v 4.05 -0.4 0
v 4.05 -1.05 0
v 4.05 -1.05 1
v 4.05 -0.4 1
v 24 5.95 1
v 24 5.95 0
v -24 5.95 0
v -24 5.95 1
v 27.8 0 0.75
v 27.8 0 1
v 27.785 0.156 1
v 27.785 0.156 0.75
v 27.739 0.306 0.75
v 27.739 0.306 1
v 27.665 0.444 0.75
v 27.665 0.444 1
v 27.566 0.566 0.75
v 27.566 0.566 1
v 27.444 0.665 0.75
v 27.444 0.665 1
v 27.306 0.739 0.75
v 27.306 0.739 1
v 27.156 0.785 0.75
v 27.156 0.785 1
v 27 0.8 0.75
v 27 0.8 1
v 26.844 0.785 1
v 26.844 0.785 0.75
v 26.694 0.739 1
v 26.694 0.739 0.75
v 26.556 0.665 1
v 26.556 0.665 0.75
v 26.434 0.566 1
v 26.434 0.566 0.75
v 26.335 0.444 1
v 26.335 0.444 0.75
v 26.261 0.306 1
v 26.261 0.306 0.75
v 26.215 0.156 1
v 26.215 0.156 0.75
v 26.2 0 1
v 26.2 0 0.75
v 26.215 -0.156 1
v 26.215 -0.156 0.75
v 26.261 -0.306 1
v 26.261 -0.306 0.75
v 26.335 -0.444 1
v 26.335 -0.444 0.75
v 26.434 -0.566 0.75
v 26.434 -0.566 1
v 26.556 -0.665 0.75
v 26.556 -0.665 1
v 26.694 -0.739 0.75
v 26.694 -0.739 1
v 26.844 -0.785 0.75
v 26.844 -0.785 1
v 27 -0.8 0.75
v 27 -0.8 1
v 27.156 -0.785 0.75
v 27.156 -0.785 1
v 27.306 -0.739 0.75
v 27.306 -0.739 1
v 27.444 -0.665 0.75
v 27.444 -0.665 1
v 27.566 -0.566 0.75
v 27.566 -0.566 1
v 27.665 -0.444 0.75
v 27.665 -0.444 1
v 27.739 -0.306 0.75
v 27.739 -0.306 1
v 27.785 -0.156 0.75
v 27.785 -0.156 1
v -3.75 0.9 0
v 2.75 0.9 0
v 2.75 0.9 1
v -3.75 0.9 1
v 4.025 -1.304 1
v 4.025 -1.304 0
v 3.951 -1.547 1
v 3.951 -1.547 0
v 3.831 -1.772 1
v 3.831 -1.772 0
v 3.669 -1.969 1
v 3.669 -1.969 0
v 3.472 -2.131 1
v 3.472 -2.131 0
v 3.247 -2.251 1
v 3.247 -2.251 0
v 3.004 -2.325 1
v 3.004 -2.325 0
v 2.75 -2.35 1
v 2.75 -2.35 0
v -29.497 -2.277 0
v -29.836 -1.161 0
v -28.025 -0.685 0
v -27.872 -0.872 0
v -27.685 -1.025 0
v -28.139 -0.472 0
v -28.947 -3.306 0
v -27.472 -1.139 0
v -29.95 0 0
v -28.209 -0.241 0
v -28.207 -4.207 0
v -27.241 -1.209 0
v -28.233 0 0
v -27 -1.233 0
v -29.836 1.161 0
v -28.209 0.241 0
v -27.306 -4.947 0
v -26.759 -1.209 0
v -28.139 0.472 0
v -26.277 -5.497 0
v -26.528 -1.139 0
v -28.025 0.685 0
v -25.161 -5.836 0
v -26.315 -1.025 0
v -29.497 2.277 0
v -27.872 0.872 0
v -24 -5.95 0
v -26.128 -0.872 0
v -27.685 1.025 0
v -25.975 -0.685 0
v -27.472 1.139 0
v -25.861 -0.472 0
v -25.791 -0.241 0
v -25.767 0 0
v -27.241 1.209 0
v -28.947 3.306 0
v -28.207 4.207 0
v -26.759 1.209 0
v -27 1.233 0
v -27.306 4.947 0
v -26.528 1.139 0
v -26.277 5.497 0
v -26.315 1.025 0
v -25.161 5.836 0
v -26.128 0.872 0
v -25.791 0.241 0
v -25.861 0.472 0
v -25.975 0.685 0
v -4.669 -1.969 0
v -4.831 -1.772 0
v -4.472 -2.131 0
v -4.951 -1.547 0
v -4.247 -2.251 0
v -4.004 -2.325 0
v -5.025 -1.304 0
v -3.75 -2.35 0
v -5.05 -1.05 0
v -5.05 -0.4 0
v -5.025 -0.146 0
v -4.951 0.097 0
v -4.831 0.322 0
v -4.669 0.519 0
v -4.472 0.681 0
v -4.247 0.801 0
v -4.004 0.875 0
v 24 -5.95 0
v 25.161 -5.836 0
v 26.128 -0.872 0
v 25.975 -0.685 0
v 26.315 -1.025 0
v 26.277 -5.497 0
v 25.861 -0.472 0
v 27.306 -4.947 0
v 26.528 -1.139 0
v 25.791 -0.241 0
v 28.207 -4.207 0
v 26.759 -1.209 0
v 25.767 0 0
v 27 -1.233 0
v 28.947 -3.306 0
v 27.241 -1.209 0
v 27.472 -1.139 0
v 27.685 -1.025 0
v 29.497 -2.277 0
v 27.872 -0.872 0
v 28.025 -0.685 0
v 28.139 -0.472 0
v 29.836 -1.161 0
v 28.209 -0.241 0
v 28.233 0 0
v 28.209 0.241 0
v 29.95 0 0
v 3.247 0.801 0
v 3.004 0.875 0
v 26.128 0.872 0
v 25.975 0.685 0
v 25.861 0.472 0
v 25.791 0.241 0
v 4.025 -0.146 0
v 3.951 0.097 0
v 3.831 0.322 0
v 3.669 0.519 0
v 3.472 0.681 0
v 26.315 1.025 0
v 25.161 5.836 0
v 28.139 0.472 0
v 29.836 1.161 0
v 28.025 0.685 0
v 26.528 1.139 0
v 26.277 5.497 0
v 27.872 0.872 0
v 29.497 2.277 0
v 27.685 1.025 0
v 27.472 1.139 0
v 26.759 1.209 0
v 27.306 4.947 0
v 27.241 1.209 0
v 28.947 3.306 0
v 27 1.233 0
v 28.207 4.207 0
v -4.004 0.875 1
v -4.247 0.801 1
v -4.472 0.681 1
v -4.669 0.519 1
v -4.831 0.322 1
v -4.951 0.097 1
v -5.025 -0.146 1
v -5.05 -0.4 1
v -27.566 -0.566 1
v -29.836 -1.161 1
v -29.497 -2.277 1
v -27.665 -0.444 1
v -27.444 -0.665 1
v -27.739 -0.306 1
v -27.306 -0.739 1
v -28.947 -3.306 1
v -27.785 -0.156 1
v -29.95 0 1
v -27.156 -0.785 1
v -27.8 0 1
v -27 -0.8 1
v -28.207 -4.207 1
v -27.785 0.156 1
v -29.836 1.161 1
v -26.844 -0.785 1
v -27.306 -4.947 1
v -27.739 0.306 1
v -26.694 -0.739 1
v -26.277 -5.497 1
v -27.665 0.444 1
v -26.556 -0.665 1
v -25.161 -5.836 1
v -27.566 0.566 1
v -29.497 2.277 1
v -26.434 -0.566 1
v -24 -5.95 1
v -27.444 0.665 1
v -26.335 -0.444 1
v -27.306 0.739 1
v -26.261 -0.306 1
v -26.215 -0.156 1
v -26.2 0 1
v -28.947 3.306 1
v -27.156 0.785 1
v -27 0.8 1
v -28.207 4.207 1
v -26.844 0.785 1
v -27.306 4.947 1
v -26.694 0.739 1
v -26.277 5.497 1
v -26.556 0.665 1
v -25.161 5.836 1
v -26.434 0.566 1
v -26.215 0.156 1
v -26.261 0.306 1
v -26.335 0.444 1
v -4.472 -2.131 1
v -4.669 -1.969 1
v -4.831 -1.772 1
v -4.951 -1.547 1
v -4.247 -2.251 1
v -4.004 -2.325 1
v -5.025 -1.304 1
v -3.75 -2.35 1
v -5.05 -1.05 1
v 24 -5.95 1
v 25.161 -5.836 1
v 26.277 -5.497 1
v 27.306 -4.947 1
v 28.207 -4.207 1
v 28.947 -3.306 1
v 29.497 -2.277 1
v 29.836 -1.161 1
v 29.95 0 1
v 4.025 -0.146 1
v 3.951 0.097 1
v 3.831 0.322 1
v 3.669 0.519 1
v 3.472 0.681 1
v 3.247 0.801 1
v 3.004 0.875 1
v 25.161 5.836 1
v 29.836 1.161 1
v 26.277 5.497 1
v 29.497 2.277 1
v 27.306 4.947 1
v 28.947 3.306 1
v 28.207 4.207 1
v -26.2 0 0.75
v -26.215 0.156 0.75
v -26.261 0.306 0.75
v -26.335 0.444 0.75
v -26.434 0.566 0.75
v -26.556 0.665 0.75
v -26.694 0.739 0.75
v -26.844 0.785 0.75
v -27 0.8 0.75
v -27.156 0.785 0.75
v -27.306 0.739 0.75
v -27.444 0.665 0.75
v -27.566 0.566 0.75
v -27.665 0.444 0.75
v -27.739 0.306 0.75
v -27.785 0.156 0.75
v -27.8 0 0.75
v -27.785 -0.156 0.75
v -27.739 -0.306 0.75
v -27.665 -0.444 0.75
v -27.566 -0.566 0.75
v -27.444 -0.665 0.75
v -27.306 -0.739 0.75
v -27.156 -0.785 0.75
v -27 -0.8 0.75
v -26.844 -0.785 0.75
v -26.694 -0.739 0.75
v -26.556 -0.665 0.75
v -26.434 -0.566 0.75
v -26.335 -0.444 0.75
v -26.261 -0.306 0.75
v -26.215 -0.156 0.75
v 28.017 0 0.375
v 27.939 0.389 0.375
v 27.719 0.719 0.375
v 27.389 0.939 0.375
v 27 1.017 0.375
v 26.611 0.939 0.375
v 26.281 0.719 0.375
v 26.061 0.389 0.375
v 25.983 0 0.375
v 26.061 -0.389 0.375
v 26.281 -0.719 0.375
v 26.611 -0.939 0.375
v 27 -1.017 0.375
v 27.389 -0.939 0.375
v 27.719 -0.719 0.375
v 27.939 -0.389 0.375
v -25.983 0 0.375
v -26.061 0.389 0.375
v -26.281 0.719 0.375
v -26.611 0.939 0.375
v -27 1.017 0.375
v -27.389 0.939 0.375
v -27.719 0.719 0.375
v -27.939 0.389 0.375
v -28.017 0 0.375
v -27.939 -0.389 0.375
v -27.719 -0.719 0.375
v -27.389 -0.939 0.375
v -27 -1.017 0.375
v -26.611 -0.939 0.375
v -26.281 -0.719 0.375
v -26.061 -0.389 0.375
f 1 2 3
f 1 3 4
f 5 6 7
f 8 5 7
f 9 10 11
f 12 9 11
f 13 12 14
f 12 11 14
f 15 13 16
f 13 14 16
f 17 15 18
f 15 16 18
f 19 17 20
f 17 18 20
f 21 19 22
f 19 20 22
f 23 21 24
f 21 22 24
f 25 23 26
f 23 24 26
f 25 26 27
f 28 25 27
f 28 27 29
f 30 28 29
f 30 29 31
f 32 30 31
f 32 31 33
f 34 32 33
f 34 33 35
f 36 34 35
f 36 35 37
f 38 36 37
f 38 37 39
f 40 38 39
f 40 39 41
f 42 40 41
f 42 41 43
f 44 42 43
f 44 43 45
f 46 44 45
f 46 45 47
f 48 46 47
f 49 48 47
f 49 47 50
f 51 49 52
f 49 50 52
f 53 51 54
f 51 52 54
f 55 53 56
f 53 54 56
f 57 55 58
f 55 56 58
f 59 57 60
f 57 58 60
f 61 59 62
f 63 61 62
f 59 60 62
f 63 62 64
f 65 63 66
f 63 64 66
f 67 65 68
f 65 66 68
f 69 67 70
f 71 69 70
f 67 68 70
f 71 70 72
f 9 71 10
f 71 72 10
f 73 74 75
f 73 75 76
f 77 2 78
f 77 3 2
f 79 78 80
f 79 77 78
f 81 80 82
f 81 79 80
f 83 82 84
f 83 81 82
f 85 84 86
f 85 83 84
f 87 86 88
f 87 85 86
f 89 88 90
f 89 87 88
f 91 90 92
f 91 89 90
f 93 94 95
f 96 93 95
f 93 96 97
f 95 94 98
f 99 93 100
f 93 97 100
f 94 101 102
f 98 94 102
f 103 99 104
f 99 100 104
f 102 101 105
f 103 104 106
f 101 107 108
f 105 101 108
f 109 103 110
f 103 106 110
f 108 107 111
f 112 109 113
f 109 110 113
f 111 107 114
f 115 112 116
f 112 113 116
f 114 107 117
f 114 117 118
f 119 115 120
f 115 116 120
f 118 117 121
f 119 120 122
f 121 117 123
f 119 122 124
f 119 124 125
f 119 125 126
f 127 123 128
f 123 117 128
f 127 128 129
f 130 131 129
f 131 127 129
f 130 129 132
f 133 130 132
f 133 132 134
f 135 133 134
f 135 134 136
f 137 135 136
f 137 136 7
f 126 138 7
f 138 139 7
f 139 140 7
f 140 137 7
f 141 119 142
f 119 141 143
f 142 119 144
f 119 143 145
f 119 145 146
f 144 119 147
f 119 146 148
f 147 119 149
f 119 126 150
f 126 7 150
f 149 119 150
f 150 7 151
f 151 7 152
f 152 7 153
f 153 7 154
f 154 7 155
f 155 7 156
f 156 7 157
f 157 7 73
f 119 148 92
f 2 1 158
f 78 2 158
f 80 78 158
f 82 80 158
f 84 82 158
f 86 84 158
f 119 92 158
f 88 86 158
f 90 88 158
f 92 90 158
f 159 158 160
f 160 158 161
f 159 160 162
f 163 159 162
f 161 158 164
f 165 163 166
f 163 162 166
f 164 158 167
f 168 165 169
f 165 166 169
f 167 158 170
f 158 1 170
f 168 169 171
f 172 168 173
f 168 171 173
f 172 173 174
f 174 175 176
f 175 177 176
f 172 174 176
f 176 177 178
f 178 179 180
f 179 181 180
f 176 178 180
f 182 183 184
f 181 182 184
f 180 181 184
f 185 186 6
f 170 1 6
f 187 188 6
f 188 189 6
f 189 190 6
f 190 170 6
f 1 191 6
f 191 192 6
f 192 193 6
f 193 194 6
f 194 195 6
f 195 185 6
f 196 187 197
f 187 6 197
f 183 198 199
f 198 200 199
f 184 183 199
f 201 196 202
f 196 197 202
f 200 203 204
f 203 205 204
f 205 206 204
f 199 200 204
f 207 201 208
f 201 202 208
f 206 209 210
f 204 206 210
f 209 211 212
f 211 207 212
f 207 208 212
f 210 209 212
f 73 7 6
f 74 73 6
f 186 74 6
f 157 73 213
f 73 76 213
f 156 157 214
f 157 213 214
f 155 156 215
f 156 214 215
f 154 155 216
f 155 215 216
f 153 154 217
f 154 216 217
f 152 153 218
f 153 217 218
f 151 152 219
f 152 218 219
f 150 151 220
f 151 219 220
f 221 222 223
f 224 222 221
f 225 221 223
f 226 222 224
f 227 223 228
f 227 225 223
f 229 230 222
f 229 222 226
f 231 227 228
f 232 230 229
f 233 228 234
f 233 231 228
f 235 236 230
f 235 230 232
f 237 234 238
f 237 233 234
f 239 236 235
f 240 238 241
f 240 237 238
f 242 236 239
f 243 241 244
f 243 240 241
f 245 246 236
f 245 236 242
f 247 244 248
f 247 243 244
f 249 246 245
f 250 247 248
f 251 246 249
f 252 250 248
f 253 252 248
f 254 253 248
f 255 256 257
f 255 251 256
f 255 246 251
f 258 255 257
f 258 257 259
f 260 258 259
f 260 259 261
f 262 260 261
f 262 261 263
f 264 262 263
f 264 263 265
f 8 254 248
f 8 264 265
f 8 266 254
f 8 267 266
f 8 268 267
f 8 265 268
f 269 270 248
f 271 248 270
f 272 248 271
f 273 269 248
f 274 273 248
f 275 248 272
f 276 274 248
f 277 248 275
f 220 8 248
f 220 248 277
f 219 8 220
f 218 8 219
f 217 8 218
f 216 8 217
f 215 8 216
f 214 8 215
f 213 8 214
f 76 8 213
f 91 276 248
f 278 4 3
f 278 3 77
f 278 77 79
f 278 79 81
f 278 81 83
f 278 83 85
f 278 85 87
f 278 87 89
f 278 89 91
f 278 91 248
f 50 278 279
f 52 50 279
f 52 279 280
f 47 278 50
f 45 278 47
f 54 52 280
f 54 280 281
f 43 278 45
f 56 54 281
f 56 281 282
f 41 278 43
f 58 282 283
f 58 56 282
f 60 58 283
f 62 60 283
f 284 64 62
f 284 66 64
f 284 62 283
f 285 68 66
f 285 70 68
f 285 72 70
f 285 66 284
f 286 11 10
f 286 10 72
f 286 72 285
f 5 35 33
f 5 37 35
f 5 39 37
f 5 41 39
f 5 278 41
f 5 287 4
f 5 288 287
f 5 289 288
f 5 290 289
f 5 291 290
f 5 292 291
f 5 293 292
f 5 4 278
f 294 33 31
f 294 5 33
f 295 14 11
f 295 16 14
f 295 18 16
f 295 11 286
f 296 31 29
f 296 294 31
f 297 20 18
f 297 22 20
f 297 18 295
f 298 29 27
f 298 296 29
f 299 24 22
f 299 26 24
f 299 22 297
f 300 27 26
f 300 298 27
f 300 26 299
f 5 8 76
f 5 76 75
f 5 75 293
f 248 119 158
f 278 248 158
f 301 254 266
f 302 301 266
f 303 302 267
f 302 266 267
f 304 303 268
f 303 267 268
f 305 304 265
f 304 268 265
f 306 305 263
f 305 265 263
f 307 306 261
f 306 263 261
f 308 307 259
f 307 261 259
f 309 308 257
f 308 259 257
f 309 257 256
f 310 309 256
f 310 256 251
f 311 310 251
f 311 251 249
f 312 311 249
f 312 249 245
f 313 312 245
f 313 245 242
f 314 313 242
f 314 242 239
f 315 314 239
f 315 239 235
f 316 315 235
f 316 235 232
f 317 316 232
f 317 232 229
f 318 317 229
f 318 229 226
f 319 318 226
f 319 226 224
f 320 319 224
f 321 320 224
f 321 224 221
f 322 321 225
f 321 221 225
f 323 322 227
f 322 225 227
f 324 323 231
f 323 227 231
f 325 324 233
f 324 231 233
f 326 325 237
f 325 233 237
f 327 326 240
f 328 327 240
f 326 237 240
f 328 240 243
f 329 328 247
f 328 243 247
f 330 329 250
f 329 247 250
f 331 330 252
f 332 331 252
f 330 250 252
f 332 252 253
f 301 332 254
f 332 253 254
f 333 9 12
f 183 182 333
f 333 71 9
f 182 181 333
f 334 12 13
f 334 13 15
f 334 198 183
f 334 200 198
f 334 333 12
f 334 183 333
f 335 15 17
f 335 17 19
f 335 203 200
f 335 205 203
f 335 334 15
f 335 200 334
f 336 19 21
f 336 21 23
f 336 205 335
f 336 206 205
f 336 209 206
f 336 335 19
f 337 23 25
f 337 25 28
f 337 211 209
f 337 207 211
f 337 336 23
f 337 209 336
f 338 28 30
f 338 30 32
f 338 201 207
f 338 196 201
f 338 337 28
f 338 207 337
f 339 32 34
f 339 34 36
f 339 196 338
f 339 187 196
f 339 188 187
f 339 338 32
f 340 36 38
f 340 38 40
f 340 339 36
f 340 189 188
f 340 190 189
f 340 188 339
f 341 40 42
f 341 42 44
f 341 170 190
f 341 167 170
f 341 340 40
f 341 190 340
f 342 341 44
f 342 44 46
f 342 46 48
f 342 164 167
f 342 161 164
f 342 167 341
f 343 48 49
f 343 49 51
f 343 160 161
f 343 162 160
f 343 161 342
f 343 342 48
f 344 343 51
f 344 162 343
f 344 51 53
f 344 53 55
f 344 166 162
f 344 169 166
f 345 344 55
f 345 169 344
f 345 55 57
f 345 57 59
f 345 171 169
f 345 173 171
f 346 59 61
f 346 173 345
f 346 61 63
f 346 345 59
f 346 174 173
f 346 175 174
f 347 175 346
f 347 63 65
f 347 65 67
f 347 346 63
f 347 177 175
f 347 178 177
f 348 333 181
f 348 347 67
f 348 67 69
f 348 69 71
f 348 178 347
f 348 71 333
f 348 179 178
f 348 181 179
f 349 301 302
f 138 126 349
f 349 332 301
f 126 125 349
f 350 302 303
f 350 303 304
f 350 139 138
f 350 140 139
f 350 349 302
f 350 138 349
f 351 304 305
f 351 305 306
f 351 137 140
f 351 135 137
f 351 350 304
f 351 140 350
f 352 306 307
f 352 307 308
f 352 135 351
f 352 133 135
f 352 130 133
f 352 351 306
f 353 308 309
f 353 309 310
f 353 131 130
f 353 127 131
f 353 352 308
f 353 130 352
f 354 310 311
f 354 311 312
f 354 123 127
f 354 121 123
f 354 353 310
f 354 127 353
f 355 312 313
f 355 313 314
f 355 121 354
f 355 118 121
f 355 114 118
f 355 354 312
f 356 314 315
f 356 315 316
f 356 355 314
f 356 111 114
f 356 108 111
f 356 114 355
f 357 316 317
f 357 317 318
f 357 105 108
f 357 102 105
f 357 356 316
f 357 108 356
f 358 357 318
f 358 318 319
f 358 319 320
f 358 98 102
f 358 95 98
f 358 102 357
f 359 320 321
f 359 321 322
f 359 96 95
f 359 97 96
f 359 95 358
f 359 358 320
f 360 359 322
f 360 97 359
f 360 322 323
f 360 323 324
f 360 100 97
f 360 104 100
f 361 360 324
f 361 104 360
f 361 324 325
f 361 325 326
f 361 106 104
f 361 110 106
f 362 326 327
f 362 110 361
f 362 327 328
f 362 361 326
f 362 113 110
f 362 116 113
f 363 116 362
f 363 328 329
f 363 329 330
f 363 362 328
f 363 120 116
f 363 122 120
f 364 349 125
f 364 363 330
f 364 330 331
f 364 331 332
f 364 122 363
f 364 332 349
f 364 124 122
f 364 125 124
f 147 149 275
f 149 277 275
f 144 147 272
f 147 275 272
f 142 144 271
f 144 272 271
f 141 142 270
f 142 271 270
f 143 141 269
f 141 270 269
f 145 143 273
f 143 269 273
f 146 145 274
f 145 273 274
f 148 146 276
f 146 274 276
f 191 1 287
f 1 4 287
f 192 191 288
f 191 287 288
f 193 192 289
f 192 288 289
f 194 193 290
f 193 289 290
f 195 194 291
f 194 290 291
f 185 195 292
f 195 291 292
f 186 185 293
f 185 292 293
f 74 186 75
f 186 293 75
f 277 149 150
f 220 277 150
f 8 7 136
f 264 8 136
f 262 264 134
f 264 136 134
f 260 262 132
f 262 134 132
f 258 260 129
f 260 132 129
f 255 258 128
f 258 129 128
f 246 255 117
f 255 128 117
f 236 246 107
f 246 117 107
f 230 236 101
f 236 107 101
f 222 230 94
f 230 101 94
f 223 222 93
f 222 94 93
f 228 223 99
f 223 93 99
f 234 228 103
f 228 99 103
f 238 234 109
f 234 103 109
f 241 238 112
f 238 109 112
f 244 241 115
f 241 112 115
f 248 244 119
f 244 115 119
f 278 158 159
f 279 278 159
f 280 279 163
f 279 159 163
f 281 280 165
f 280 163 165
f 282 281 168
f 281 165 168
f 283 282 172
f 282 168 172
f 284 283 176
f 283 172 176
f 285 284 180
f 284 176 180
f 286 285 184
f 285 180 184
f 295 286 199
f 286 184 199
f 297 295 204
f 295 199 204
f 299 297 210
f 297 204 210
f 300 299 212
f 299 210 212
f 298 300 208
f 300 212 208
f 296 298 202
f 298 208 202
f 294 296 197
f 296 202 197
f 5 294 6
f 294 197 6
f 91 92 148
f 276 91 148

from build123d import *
from OCP.BRepFilletAPI import BRepFilletAPI_MakeChamfer

# Parameters (mm, degrees)
BOSS_EXTRUDE2_DEPTH = 1
SKETCH4_R           = 0.8
CUT_EXTRUDE1_DEPTH  = 31.551677532
SKETCH5_W           = 9.1
SKETCH5_H           = 3.25
CUT_EXTRUDE2_DEPTH  = 31.551677532
FILLET1_R           = 1.3
CHAMFER1_SIZE       = 0.75
CHAMFER1_SIZE2      = 0.433012702


with BuildPart() as part:
    # Sketch3 → Boss-Extrude2 (new body)
    with BuildSketch(Plane.XY):
        with BuildLine():
            Line((24, 5.95), (-24, 5.95))
            ThreePointArc((-24, 5.95), (-29.95, 0), (-24, -5.95))
            Line((-24, -5.95), (24, -5.95))
            ThreePointArc((24, -5.95), (29.95, 0), (24, 5.95))
        make_face()
    extrude(amount=BOSS_EXTRUDE2_DEPTH)

    # Sketch4 → Cut-Extrude1 (cut, through all)
    with BuildSketch(Plane.XY.offset(1)):
        with Locations((-27, 0)):
            Circle(SKETCH4_R)
        with Locations((27, 0)):
            Circle(SKETCH4_R)
    extrude(amount=-CUT_EXTRUDE1_DEPTH, mode=Mode.SUBTRACT)

    # Sketch5 → Cut-Extrude2 (cut, through all)
    with BuildSketch(Plane(origin=(0, 0, 0), x_dir=(-1, 0, 0), z_dir=(0, 0, -1))):
        with Locations((0.5, -0.725)):
            Rectangle(SKETCH5_W, SKETCH5_H)
    extrude(amount=-CUT_EXTRUDE2_DEPTH, mode=Mode.SUBTRACT)

    # Fillet1
    fillet1_edges = [part.edges().sort_by_distance(p)[0] for p in [
        (4.05, -2.35, 0.5),
        (4.05, 0.9, 0.5),
        (-5.05, 0.9, 0.5),
        (-5.05, -2.35, 0.5),
    ]]
    fillet(fillet1_edges, radius=FILLET1_R)

    # Chamfer1: one chamfer whose edges measure the first distance from different faces: ONE call of the kernel's chamfer builder (chamfer() names one face for all edges)
    chamfer1_edges_1 = [part.edges().sort_by_distance(p)[0] for p in [
        (-27.8, 0, 0),
    ]]
    chamfer1_side_1 = [part.faces().sort_by_distance(p)[0] for p in [
        (-27.8, 0, 0.5),
    ]]
    chamfer1_edges_2 = [part.edges().sort_by_distance(p)[0] for p in [
        (26.2, 0, 0),
    ]]
    chamfer1_side_2 = [part.faces().sort_by_distance(p)[0] for p in [
        (26.2, 0, 0.5),
    ]]
    chamfer1 = BRepFilletAPI_MakeChamfer(part.part.solid().wrapped)
    for e in chamfer1_edges_1:
        chamfer1.Add(CHAMFER1_SIZE, CHAMFER1_SIZE2, e.wrapped, chamfer1_side_1[0].wrapped)  # the first distance lies on this face
    for e in chamfer1_edges_2:
        chamfer1.Add(CHAMFER1_SIZE, CHAMFER1_SIZE2, e.wrapped, chamfer1_side_2[0].wrapped)  # the first distance lies on this face
    add(Compound.cast(chamfer1.Shape()), mode=Mode.REPLACE)


solid = part.part
